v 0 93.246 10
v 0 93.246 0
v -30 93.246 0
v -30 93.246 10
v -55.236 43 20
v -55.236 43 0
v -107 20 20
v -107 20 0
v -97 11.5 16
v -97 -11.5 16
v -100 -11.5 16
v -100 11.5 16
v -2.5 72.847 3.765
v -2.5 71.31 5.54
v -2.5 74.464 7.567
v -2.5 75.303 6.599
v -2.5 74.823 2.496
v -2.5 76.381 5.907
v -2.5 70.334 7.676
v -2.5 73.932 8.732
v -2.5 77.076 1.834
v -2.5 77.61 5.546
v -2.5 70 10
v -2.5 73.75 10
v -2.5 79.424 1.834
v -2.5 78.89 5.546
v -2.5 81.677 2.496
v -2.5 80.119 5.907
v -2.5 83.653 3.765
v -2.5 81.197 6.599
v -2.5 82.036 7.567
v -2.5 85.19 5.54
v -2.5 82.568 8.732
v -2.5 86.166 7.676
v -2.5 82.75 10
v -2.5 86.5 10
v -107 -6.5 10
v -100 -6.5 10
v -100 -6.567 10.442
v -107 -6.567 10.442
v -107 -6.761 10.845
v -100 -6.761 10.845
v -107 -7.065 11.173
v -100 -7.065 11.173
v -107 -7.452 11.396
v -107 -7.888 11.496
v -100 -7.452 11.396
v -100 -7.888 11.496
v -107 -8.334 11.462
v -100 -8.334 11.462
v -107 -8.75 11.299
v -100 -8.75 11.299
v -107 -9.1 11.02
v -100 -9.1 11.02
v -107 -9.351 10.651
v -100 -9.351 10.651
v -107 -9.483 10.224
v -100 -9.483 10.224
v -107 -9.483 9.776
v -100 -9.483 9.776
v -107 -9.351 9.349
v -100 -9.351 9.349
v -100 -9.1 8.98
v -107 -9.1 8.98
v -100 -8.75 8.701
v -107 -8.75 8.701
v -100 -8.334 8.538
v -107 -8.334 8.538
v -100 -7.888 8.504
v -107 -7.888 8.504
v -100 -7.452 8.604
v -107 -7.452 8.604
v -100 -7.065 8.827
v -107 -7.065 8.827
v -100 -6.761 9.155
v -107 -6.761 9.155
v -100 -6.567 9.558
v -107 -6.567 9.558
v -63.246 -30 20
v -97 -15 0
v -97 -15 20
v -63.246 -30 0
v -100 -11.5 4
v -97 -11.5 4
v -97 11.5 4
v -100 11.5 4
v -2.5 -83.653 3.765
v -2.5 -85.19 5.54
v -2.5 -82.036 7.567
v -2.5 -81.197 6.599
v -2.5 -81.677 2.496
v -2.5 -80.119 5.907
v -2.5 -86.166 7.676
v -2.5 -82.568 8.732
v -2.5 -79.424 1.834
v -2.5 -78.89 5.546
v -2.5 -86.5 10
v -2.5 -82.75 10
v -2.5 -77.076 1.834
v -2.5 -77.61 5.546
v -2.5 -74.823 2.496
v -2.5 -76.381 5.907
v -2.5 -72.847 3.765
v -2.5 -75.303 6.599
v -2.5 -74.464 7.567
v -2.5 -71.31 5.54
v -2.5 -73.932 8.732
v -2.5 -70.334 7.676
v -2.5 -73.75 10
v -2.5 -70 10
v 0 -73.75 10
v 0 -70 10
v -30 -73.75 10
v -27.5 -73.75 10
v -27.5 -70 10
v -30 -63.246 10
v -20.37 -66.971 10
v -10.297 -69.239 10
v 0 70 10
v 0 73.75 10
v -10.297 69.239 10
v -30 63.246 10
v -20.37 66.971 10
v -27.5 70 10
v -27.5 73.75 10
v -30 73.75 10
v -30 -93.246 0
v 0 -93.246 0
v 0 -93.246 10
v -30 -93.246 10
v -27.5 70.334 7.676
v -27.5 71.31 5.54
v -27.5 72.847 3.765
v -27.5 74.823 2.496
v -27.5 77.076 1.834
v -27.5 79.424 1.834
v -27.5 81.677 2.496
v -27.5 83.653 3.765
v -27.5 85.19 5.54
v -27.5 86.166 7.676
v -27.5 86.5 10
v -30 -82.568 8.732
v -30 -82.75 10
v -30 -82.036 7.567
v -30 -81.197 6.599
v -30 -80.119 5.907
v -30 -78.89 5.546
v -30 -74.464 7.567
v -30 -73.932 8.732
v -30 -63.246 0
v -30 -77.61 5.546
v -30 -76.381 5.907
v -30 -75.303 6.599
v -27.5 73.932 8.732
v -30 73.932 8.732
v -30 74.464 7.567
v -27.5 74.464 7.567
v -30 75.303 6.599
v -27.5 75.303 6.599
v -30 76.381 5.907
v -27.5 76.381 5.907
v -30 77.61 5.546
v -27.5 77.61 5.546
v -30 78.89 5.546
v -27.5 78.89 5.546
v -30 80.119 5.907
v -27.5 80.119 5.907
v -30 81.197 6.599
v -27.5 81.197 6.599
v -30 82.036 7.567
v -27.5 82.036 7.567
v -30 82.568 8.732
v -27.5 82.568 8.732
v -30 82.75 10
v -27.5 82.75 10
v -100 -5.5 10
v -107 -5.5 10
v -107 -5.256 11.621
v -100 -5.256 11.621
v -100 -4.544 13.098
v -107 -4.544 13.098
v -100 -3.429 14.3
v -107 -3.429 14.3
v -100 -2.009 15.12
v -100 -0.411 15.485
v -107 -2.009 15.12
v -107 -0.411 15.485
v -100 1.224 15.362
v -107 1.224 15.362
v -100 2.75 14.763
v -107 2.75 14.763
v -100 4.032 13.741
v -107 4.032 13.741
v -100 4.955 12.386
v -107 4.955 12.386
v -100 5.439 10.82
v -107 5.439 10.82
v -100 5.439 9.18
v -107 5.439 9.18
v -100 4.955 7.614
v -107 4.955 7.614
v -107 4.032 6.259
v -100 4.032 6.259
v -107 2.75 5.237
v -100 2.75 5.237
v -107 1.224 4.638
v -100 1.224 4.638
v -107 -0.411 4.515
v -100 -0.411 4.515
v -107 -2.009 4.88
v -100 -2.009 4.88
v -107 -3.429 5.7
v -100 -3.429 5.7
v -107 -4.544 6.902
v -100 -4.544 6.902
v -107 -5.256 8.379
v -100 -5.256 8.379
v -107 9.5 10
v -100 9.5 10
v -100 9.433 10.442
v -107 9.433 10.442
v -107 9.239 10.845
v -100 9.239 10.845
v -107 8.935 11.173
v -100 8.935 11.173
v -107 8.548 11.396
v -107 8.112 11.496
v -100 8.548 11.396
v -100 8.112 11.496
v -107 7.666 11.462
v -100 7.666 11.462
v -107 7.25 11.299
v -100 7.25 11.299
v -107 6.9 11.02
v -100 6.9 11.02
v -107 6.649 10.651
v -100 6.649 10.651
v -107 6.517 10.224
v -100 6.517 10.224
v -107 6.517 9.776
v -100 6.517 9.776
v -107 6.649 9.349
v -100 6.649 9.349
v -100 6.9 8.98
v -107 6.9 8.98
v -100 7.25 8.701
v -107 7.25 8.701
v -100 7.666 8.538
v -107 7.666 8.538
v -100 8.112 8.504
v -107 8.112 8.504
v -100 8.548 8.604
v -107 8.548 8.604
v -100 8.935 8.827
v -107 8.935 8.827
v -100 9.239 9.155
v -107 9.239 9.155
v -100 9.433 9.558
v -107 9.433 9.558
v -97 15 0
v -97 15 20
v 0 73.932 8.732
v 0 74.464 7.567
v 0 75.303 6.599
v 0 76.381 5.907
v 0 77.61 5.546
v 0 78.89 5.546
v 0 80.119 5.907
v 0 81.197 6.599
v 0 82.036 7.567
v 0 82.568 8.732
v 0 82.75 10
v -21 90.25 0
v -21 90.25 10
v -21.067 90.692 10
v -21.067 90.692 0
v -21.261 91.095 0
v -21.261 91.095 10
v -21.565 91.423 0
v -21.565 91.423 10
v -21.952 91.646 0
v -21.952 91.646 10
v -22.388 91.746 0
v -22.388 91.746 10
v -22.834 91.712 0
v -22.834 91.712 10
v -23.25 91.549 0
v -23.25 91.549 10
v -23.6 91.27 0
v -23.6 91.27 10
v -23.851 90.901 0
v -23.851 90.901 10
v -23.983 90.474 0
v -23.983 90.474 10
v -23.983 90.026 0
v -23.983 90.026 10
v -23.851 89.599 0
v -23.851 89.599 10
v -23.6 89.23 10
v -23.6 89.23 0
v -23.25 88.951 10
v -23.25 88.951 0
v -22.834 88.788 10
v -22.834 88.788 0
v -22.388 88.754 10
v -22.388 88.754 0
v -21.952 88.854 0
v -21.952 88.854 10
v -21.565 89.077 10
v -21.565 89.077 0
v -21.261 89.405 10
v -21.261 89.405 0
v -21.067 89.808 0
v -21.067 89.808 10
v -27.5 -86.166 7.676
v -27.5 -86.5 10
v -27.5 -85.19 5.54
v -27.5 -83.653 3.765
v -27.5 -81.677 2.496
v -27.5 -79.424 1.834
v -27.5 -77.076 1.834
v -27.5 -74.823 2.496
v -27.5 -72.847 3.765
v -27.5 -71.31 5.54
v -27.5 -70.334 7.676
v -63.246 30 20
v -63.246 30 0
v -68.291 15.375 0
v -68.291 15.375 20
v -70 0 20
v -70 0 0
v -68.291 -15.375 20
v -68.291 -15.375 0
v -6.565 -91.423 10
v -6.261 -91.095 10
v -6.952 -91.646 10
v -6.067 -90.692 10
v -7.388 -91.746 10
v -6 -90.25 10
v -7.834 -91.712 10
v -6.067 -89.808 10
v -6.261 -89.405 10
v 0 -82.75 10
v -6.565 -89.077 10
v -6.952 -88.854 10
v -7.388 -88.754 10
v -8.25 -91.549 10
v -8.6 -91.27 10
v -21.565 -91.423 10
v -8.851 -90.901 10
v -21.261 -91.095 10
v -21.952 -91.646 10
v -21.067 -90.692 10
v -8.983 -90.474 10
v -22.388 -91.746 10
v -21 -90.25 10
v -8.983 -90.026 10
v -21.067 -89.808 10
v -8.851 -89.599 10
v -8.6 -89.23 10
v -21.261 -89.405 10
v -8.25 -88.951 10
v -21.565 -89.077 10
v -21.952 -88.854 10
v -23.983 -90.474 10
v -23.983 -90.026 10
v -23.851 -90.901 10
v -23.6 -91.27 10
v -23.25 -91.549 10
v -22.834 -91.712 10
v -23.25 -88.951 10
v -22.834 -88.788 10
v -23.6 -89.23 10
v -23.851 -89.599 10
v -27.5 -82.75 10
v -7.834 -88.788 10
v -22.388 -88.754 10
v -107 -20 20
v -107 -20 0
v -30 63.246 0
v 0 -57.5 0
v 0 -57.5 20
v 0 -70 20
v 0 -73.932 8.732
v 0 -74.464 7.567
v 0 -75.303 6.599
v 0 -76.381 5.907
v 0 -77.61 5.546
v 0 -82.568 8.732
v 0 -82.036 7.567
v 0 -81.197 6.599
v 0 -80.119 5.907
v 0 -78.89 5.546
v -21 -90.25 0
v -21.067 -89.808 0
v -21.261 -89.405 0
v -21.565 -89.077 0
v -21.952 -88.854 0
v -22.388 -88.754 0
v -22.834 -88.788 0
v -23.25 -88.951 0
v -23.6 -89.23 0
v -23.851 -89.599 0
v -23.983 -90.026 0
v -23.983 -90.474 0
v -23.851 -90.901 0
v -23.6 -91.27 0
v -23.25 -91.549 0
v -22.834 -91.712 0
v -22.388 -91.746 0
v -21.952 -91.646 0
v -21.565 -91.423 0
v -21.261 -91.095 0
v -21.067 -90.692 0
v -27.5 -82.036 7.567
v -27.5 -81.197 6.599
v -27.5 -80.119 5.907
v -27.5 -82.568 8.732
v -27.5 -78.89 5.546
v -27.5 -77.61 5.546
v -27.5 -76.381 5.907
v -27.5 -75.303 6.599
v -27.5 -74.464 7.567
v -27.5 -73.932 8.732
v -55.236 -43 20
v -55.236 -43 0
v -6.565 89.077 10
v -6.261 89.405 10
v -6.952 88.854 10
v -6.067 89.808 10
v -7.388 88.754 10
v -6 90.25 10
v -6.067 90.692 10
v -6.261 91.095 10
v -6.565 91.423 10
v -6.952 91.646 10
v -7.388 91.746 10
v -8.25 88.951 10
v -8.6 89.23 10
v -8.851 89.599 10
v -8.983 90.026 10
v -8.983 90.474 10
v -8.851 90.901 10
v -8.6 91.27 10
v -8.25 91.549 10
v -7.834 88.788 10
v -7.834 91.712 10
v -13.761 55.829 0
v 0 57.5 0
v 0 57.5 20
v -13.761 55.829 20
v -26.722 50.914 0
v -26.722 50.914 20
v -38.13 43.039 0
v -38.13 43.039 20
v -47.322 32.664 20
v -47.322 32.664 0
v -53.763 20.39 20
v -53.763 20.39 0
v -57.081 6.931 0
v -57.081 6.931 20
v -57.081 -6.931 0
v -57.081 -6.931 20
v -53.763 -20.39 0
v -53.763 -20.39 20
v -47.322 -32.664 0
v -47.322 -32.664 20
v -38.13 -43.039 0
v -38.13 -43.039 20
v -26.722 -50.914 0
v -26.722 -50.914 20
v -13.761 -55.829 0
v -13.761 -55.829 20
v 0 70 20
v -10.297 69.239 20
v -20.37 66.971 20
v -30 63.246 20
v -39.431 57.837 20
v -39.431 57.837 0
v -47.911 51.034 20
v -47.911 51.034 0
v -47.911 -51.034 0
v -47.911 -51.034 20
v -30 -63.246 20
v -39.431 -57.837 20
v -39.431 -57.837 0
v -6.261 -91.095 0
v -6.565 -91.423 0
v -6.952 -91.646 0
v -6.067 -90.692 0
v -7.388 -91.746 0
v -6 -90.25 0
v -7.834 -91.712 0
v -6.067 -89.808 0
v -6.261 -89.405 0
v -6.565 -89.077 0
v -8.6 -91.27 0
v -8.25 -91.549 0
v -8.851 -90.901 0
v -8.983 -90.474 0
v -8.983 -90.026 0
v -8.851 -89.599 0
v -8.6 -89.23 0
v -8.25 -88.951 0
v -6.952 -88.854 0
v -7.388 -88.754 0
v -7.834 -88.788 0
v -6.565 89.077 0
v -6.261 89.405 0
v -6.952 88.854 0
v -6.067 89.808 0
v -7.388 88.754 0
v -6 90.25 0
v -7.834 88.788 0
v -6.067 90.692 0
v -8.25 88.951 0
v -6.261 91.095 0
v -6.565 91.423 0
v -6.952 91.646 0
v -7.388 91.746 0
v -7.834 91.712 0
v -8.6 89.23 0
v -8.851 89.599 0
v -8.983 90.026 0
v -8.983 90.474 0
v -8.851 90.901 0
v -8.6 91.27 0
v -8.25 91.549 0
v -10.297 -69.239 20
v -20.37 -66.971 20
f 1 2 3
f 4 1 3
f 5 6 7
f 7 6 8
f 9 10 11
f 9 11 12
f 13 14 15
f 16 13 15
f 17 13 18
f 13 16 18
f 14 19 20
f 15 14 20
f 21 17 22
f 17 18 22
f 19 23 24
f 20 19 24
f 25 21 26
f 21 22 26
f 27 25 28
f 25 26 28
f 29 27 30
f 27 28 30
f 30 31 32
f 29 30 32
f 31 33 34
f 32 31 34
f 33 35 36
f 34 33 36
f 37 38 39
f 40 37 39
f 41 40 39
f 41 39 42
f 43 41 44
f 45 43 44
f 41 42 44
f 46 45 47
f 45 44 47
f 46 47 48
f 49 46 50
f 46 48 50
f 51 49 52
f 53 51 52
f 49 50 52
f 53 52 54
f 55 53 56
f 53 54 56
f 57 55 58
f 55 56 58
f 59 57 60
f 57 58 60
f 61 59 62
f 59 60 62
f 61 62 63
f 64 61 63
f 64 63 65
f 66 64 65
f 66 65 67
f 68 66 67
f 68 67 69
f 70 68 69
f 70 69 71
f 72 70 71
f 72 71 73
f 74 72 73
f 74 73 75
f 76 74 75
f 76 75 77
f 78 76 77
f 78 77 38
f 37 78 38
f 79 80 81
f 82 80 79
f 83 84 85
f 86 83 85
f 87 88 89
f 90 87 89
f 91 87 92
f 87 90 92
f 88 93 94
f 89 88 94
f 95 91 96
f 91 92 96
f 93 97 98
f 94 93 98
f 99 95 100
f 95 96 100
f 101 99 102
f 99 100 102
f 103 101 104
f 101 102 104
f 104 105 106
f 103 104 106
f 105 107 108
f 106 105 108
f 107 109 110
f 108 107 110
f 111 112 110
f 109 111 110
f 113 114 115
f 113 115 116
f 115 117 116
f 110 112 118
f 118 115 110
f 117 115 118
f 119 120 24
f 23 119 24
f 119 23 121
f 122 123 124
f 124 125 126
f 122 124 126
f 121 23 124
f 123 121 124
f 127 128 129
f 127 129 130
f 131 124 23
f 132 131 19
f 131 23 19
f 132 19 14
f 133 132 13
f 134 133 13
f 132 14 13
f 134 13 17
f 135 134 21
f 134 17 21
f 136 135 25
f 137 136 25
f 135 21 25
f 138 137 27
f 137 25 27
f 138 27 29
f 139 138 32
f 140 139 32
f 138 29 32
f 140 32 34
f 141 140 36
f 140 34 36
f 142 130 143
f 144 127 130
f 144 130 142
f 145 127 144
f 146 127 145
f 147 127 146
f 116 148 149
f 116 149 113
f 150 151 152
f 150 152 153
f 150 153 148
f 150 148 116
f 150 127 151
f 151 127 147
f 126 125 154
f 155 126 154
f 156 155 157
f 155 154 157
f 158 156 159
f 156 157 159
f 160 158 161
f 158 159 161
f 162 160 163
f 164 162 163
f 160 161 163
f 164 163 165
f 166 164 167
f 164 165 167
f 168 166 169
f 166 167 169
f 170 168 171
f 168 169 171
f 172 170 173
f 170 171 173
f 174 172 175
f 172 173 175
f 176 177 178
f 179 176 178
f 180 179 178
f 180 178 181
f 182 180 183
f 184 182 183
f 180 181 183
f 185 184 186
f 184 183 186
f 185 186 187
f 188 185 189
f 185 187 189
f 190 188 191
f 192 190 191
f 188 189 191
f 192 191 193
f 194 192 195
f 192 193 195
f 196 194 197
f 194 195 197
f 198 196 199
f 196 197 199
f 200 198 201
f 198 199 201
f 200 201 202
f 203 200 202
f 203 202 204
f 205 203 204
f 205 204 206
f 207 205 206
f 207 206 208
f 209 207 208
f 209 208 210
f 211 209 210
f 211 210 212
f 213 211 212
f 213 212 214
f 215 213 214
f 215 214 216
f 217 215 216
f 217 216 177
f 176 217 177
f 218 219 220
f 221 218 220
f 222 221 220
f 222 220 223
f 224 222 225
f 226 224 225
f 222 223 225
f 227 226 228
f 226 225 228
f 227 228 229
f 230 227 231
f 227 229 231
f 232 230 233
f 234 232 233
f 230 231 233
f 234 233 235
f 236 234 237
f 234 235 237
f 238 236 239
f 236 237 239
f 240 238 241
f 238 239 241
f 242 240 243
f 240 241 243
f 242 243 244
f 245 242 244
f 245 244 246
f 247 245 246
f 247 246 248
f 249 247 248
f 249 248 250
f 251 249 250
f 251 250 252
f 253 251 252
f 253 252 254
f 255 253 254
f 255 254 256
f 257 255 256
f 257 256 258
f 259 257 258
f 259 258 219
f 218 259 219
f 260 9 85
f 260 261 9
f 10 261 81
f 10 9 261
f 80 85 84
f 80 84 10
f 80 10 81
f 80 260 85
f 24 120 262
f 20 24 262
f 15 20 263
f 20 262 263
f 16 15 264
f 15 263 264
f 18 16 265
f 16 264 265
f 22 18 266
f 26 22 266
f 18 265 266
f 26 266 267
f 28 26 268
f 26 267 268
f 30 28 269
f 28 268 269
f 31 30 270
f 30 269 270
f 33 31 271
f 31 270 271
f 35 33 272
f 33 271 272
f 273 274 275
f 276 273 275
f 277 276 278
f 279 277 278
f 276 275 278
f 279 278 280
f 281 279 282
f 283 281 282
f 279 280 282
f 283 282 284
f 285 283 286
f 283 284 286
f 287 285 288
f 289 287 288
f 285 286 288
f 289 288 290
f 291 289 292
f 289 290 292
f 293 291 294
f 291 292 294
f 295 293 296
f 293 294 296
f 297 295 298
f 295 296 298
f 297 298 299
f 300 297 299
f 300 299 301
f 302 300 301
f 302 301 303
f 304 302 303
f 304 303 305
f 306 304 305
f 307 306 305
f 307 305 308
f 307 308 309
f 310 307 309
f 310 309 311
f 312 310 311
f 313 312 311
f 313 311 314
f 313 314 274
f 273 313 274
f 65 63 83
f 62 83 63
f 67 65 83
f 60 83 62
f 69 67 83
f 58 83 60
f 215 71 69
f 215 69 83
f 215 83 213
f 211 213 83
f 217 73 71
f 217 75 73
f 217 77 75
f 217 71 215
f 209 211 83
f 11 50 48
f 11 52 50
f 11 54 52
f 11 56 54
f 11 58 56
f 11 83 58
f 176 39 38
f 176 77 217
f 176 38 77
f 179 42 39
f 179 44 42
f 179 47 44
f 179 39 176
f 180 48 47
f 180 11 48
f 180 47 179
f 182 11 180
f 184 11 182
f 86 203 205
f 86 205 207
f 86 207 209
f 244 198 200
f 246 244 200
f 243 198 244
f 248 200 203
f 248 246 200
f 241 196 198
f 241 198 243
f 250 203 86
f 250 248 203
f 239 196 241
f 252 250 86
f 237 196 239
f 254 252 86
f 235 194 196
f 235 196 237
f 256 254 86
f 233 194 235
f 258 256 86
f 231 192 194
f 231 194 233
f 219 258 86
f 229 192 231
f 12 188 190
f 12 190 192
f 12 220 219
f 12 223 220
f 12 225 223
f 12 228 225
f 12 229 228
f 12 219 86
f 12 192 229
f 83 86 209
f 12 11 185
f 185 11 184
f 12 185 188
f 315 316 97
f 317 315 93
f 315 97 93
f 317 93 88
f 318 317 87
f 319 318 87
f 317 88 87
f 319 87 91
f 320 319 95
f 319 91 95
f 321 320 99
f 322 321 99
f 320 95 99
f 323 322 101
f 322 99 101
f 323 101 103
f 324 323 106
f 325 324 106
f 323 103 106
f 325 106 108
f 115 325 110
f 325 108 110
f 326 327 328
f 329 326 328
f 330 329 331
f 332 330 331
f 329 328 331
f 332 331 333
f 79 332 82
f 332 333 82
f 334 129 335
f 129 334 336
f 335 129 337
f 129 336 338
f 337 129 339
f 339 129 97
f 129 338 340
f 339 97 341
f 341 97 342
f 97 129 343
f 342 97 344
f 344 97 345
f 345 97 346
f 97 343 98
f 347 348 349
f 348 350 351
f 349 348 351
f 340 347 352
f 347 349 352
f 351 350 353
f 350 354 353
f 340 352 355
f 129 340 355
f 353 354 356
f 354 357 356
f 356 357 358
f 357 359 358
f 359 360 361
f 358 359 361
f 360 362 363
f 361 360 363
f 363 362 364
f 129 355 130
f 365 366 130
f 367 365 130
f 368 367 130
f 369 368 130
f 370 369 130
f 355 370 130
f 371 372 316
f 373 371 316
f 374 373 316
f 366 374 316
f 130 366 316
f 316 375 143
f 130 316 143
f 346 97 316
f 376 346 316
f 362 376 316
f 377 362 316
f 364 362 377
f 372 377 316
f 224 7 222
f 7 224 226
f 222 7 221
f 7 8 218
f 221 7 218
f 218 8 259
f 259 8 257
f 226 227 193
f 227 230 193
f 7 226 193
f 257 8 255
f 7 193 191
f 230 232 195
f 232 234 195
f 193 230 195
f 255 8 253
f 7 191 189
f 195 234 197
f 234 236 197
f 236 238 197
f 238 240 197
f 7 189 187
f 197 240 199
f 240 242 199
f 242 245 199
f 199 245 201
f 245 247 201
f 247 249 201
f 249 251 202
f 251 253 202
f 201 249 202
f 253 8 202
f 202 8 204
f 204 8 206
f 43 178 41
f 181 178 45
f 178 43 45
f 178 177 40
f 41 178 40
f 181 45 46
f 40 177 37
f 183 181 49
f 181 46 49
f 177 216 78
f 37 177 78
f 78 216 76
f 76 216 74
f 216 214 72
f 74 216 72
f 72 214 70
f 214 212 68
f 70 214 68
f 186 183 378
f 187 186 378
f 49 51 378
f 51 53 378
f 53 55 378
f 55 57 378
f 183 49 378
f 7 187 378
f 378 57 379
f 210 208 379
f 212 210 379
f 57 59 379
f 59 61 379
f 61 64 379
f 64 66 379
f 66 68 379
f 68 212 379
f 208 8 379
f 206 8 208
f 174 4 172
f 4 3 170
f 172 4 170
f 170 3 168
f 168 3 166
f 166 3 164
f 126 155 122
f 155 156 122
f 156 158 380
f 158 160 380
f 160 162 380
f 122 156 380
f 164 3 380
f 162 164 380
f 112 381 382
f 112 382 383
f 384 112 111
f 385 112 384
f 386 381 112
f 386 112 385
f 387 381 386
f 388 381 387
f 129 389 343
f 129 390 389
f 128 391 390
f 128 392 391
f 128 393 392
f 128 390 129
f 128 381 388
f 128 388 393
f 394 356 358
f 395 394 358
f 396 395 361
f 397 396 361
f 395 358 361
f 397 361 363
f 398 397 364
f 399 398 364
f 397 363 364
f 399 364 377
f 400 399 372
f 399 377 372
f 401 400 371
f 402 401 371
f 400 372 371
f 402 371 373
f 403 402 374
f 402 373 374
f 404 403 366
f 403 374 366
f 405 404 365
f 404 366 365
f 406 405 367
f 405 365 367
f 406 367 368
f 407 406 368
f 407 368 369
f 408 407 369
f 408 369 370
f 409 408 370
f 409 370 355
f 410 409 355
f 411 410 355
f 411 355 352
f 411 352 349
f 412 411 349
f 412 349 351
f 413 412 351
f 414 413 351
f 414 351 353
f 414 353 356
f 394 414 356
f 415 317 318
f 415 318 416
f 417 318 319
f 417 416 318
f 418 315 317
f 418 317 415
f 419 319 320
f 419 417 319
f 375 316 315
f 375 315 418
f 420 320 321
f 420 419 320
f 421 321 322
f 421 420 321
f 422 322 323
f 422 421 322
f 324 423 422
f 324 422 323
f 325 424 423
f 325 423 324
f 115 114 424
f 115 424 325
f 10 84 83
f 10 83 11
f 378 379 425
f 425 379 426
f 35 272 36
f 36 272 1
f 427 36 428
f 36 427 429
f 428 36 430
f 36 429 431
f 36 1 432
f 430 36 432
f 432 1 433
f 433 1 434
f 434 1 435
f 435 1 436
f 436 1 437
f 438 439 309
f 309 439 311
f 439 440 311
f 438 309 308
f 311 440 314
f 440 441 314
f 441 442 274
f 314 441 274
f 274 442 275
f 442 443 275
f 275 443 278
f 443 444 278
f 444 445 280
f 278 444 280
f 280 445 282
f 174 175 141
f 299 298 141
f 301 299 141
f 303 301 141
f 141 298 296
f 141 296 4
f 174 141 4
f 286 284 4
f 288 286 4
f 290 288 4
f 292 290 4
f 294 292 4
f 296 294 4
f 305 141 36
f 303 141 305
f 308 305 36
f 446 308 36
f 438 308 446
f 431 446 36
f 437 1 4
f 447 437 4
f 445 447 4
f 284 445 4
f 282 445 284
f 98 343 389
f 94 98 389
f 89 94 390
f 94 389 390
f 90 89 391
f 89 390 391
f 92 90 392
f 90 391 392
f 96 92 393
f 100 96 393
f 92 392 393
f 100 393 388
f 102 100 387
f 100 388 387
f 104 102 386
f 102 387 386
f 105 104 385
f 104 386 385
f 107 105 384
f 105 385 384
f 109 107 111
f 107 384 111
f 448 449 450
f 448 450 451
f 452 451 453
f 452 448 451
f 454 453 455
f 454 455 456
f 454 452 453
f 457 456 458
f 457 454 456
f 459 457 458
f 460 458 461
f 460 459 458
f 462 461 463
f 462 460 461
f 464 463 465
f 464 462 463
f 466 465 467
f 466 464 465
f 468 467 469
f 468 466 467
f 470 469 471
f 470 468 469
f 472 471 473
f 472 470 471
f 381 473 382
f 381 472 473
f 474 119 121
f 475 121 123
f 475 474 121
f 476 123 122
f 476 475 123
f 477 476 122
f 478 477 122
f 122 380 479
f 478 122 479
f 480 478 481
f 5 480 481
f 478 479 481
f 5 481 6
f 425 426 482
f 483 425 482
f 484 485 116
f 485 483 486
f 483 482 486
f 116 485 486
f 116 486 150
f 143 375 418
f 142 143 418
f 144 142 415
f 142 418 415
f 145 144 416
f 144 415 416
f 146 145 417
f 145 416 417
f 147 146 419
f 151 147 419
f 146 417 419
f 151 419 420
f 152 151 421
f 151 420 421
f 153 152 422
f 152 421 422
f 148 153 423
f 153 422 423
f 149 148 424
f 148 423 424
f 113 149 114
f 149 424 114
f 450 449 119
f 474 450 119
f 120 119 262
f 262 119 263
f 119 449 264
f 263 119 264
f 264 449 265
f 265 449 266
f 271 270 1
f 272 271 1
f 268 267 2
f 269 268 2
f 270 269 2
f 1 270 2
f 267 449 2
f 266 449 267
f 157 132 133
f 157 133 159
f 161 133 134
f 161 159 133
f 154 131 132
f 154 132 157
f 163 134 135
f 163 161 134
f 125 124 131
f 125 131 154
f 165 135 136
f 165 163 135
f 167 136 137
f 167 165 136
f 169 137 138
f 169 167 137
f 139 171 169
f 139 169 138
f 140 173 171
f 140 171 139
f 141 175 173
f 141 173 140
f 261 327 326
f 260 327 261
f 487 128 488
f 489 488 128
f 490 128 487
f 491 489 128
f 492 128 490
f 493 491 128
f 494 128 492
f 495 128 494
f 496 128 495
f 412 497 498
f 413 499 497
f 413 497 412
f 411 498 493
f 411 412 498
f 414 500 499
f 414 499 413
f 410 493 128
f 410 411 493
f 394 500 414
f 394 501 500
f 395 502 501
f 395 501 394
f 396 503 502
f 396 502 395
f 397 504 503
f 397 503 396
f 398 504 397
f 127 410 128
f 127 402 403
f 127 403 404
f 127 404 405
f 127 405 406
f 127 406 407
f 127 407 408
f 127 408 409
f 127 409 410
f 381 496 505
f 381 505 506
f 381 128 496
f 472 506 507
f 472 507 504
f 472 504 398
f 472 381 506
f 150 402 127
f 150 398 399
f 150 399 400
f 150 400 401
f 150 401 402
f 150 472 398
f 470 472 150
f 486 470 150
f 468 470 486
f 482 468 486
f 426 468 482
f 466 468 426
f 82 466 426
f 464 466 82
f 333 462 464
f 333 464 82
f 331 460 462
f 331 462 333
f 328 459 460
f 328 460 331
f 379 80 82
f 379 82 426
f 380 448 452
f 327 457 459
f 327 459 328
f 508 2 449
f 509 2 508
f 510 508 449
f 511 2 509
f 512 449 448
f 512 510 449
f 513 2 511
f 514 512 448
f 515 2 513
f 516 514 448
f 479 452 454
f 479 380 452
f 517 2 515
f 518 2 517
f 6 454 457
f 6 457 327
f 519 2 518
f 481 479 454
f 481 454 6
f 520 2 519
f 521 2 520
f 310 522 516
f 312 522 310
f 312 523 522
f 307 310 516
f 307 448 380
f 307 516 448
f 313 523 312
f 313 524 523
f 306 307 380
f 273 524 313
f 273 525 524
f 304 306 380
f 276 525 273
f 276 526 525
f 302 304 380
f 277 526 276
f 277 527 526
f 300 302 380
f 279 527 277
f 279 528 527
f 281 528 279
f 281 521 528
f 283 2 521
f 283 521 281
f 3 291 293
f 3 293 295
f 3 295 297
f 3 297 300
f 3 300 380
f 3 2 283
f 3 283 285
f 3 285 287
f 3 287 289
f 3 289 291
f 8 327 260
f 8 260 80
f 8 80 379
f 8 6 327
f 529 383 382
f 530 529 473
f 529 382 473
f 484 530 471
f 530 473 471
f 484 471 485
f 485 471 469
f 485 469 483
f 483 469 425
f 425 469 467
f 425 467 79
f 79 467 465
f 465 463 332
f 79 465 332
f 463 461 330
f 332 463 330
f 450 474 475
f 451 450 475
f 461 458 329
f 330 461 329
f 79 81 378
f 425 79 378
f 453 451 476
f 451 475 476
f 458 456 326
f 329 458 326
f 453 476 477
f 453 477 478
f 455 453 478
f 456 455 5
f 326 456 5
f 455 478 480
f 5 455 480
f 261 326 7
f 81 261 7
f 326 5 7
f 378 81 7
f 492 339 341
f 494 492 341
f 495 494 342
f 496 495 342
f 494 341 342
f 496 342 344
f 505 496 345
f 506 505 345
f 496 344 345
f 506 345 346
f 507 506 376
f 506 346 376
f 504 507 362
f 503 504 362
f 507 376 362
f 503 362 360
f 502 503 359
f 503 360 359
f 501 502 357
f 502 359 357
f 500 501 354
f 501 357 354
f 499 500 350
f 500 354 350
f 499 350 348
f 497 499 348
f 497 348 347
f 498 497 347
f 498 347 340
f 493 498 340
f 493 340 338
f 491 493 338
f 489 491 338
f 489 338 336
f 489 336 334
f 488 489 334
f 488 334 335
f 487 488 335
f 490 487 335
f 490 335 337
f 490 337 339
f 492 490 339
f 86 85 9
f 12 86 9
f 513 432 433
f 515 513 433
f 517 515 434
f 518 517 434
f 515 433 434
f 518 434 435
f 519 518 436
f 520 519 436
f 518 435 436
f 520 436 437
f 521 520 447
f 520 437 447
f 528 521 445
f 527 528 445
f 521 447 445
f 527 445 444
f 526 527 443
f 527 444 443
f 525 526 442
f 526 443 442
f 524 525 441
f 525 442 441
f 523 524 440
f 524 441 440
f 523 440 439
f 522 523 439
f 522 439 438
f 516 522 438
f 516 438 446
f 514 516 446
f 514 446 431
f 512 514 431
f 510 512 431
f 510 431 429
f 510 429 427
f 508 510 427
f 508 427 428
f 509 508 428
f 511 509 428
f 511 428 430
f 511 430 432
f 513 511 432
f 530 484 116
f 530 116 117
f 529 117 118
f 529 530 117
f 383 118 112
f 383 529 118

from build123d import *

# Parameters (mm, degrees)
PAD_DEPTH       = 20
SKETCH001_R     = 4.5
POCKET_DEPTH    = 107.001
SKETCH002_R     = 8.25
POCKET001_DEPTH = 25
POCKET002_DEPTH = 10
SKETCH004_R     = 1.5
POCKET003_DEPTH = 10.001
SKETCH005_R     = 5.5
POCKET004_DEPTH = 10
SKETCH006_W     = 23
SKETCH006_H     = 12
POCKET005_DEPTH = 3
SKETCH007_R     = 1.5
POCKET006_DEPTH = 7.001


with BuildPart() as part:
    # Sketch → Pad (new body)
    with BuildSketch(Plane.XY):
        with BuildLine():
            ThreePointArc((0, 57.5), (-57.5, 0), (0, -57.5))
            Line((0, -57.5), (0, -93.245553))
            Line((0, -93.245553), (-30, -93.245553))
            Line((-30, -93.245553), (-30, -63.245553))
            ThreePointArc((-55.235858, -43), (-43.803635, -54.600747), (-30, -63.245553))
            Line((-107, -20), (-55.235858, -43))
            Line((-107, 20), (-107, -20))
            Line((-55.235858, 43), (-107, 20))
            ThreePointArc((-30, 63.245553), (-43.803635, 54.600747), (-55.235858, 43))
            Line((-30, 93.245553), (-30, 63.245553))
            Line((0, 93.245553), (-30, 93.245553))
            Line((0, 57.5), (0, 93.245553))
        make_face()
        with BuildLine():
            Line((-63.245553, 30), (-97, 15))
            Line((-97, 15), (-97, -15))
            Line((-97, -15), (-63.245553, -30))
            ThreePointArc((-63.245553, 30), (-70, 0), (-63.245553, -30))
        make_face(mode=Mode.SUBTRACT)
    extrude(amount=PAD_DEPTH)

    # Sketch001 (on Face2 of Pad) → Pocket (cut, through all)
    with BuildSketch(Plane.YZ):
        with Locations((-78.25, 10)):
            Circle(SKETCH001_R)
        with Locations((78.25, 10)):
            Circle(SKETCH001_R)
    extrude(amount=-POCKET_DEPTH, mode=Mode.SUBTRACT)

    # Sketch002 (on Face3 of Pocket) → Pocket001 (cut)
    with BuildSketch(Plane.YZ.offset(-2.5)):
        with Locations((-78.25, 10)):
            Circle(SKETCH002_R)
        with Locations((78.25, 10)):
            Circle(SKETCH002_R)
    extrude(amount=-POCKET001_DEPTH, mode=Mode.SUBTRACT)

    # Sketch003 (on Face5 of Pocket001) → Pocket002 (cut)
    with BuildSketch(Plane.XY.offset(20)):
        with BuildLine():
            ThreePointArc((0, 70), (-16.341175, 68.065894), (-31.779335, 62.370457))
            Line((-31.779335, 62.370457), (-31.779335, 95))
            Line((-31.779335, 95), (0, 95))
            Line((0, 95), (0, 70))
        make_face()
        with BuildLine():
            ThreePointArc((-31.779335, -62.370457), (-16.341175, -68.065894), (0, -70))
            Line((0, -95), (0, -70))
            Line((-31.779335, -95), (0, -95))
            Line((-31.779335, -62.370457), (-31.779335, -95))
        make_face()
    extrude(amount=-POCKET002_DEPTH, mode=Mode.SUBTRACT)

    # Sketch004 (on Face11 of Pocket002) → Pocket003 (cut, through all)
    with BuildSketch(Plane.XY.offset(10)):
        with Locations((-22.5, 90.25)):
            Circle(SKETCH004_R)
        with Locations((-7.5, 90.25)):
            Circle(SKETCH004_R)
        with Locations((-7.5, -90.25)):
            Circle(SKETCH004_R)
        with Locations((-22.5, -90.25)):
            Circle(SKETCH004_R)
    extrude(amount=-POCKET003_DEPTH, mode=Mode.SUBTRACT)

    # Sketch005 (on Face20 of Pocket003) → Pocket004 (cut)
    with BuildSketch(Plane(origin=(-107, 0, 0), x_dir=(0, -1, 0), z_dir=(-1, 0, 0))):
        with Locations((0, 10)):
            Circle(SKETCH005_R)
    extrude(amount=-POCKET004_DEPTH, mode=Mode.SUBTRACT)

    # Sketch006 (on Face25 of Pocket004) → Pocket005 (cut)
    with BuildSketch(Plane.YZ.offset(-97)):
        with Locations((0, 10)):
            Rectangle(SKETCH006_W, SKETCH006_H)
    extrude(amount=-POCKET005_DEPTH, mode=Mode.SUBTRACT)

    # Sketch007 (on Face42 of Pocket005) → Pocket006 (cut, through all)
    with BuildSketch(Plane.YZ.offset(-100)):
        with Locations((-8, 10)):
            Circle(SKETCH007_R)
        with Locations((8, 10)):
            Circle(SKETCH007_R)
    extrude(amount=-POCKET006_DEPTH, mode=Mode.SUBTRACT)


solid = part.part
